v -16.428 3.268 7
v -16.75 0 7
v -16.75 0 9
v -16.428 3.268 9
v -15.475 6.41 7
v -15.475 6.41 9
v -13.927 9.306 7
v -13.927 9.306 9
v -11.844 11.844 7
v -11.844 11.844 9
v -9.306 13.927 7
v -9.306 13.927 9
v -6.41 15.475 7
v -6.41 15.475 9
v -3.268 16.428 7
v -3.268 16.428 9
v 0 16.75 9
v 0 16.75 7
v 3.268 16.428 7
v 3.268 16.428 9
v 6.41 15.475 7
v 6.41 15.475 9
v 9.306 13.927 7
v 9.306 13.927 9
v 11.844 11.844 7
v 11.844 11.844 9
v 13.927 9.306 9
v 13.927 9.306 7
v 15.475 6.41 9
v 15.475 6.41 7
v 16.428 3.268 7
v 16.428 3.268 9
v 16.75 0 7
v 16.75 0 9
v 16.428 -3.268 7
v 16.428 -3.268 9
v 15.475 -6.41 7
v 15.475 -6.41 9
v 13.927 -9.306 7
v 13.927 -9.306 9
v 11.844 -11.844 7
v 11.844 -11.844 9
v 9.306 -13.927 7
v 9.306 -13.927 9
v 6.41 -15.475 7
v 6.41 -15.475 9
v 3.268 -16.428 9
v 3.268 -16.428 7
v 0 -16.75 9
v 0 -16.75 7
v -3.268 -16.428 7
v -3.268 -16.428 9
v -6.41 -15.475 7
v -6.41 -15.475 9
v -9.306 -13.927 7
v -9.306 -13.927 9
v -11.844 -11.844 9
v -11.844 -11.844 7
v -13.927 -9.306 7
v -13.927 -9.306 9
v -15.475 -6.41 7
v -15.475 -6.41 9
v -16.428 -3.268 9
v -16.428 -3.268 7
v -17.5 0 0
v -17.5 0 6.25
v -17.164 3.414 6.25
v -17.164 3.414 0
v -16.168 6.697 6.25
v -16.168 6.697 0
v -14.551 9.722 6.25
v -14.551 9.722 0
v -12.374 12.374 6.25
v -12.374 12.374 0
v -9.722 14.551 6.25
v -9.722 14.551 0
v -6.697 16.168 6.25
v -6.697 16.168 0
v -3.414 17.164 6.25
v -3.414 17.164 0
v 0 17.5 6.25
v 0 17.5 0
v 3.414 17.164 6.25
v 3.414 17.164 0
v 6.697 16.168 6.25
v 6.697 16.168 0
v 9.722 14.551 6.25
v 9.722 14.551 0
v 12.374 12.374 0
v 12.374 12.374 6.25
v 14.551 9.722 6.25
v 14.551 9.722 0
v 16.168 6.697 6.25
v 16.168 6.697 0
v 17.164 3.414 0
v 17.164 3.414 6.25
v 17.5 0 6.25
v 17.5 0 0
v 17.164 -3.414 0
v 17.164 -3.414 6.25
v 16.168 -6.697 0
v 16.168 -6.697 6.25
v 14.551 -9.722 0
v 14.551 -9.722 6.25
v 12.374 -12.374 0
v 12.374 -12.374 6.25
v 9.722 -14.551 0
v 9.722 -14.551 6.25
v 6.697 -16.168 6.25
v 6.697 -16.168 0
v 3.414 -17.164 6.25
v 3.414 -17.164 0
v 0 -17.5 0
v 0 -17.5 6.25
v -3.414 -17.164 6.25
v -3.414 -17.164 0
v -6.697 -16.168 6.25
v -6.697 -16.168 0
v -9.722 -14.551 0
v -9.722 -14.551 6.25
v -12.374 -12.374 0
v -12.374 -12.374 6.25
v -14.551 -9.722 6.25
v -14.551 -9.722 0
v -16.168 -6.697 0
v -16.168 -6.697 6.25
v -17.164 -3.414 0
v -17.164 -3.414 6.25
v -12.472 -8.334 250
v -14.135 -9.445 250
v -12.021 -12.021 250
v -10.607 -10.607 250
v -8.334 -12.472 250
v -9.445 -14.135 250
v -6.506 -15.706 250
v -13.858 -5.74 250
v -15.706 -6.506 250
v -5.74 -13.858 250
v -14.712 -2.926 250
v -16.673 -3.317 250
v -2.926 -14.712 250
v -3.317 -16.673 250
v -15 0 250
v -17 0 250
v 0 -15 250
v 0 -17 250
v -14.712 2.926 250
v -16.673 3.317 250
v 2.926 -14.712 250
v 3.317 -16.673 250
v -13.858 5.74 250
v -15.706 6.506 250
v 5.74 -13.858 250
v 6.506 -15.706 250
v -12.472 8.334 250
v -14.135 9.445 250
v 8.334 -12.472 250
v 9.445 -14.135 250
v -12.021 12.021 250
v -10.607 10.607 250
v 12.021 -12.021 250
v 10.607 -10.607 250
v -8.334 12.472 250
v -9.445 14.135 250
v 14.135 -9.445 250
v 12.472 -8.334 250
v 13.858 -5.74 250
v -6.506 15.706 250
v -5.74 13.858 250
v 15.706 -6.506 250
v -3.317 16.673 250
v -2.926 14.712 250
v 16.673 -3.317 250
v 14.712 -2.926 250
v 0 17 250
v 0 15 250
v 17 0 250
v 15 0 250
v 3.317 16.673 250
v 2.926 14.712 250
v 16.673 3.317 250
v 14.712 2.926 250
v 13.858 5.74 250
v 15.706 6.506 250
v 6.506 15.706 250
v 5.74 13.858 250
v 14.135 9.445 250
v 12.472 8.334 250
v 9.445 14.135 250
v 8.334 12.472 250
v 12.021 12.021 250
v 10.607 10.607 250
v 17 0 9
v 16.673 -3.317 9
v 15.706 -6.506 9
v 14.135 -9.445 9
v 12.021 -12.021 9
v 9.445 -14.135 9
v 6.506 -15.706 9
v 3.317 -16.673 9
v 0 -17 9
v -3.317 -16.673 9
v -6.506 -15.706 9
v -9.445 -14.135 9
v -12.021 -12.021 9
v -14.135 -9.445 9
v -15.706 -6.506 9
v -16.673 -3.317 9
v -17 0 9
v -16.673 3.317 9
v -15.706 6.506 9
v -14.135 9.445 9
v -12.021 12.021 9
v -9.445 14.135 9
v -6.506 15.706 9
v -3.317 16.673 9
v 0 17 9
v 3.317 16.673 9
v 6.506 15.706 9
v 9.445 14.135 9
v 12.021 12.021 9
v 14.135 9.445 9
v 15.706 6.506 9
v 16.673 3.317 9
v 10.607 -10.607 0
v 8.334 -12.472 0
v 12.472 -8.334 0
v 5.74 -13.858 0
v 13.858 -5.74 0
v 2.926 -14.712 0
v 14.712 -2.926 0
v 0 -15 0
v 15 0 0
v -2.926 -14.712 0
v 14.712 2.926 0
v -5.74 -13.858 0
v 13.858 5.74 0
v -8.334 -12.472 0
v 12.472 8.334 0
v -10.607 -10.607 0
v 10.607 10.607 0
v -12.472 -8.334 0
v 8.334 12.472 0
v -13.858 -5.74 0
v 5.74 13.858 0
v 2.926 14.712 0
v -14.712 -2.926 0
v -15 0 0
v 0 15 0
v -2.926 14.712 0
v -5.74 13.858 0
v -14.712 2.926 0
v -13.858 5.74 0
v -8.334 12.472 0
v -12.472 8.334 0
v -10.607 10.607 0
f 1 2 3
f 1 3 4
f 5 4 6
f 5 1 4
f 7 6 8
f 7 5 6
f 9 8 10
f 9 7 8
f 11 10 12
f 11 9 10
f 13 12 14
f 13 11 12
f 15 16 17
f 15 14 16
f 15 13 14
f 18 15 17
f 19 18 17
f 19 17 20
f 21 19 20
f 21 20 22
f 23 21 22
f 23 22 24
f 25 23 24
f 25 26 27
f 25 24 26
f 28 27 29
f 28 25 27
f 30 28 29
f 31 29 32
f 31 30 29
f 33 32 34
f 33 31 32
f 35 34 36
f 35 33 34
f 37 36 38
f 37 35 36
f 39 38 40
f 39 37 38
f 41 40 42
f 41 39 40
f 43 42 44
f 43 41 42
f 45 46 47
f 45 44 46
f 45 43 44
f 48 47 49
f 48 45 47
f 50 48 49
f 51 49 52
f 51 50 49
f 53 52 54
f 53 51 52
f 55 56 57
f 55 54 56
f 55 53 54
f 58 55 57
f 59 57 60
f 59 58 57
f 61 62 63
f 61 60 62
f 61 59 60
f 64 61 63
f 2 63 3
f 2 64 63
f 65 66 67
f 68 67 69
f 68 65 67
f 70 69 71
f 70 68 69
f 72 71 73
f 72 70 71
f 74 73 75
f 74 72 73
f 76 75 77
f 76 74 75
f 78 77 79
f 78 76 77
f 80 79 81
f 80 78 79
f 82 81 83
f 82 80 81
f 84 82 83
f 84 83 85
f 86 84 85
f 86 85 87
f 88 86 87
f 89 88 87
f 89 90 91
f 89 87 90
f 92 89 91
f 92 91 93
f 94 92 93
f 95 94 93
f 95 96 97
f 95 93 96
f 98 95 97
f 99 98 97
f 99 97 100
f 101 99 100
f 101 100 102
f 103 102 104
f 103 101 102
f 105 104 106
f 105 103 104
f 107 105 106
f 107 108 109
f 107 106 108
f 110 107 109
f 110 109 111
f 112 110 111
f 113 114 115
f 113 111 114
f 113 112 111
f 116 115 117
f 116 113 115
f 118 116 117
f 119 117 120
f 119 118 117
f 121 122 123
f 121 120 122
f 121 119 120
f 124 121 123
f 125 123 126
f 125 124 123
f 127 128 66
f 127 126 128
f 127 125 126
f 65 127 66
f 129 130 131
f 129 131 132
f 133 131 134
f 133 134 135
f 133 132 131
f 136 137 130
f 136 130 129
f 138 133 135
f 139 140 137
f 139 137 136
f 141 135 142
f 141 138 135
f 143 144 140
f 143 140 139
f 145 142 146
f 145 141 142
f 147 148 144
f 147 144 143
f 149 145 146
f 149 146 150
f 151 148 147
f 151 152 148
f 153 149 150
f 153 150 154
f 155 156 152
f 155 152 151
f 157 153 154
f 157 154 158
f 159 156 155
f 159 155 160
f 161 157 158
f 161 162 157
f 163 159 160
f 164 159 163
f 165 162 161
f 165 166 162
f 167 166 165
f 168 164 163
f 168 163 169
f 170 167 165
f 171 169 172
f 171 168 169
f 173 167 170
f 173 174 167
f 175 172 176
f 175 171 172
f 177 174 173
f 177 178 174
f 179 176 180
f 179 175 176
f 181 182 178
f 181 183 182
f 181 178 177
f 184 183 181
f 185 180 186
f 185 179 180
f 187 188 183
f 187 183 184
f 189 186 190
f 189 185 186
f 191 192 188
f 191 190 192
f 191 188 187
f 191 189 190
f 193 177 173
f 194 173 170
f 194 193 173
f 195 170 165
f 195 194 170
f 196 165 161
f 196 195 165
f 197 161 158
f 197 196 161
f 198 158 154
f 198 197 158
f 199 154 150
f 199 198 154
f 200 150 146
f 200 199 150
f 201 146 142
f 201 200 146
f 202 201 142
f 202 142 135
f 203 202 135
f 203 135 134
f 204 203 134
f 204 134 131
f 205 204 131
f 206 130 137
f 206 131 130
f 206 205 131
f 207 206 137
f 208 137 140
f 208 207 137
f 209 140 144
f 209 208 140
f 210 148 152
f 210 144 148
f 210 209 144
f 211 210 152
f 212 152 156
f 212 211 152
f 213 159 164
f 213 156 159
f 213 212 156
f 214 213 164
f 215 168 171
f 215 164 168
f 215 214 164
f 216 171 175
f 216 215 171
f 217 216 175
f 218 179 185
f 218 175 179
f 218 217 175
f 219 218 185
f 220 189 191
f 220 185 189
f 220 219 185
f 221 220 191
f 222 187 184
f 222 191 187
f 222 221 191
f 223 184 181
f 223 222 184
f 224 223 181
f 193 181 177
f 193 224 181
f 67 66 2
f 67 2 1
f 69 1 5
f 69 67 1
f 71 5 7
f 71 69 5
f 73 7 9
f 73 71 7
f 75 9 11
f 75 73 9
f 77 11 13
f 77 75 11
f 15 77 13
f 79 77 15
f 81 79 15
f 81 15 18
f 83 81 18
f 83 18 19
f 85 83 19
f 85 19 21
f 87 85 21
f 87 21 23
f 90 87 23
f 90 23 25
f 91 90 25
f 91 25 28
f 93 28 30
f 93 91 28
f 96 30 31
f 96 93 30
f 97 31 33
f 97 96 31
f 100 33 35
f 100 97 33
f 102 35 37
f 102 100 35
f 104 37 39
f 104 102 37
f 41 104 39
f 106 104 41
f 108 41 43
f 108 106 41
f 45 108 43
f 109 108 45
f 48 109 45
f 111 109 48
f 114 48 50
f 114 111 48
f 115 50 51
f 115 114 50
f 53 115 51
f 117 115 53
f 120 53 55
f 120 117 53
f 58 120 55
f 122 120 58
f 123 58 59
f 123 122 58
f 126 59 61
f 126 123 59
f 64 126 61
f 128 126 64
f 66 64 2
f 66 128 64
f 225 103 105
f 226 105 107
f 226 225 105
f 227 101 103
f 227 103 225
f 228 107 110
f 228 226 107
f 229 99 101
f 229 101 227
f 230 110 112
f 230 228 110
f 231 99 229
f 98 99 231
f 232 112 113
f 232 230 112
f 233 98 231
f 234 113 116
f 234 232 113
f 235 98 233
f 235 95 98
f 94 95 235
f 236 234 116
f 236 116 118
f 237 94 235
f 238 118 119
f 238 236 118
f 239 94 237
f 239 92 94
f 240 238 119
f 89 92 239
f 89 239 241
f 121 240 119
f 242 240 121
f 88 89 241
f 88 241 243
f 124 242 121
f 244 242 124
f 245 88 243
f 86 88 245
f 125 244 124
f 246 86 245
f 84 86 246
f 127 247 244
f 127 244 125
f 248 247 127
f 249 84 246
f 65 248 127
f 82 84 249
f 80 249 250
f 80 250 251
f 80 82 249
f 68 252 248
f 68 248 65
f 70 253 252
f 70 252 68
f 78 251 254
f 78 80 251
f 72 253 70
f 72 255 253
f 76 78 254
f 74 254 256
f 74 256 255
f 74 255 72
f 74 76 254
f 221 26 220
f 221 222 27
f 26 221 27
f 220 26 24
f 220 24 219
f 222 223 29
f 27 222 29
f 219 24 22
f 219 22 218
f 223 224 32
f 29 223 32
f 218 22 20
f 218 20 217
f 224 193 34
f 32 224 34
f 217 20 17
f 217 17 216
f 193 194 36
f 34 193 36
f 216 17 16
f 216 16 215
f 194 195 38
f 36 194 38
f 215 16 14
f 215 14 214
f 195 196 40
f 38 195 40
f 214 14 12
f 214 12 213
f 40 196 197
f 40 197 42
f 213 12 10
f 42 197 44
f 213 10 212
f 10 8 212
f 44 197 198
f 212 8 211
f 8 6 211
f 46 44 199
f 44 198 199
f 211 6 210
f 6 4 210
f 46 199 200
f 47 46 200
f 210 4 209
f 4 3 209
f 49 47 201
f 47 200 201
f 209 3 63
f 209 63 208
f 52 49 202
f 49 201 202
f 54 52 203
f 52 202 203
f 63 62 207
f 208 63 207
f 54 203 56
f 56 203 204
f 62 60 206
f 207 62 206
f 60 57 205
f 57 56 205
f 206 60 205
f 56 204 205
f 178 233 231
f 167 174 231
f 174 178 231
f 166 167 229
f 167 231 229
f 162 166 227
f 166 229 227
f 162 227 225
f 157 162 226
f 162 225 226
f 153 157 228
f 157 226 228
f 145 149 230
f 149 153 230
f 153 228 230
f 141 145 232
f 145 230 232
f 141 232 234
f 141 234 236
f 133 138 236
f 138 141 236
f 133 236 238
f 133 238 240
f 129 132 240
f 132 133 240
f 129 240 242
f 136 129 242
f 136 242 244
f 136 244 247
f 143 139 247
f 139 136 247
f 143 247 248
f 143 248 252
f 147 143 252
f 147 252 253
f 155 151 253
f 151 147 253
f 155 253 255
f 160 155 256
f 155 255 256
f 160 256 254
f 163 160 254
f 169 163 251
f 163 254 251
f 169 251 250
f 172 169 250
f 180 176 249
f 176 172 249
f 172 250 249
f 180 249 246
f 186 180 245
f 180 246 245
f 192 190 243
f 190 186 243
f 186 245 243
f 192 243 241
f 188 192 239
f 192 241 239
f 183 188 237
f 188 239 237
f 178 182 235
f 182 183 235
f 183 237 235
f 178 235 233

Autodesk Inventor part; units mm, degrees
ref_plane "YZ Plane" through (0, 0, 0) normal (1, 0, 0) x (0, 1, 0)
ref_plane "XZ Plane" through (0, 0, 0) normal (0, 1, 0) x (-1, 0, 0)
ref_plane "XY Plane" through (0, 0, 0) normal (0, 0, 1) x (1, 0, 0)
sketch "Skizze1" plane through (0, 0, 0) normal (0, 0, 1) x (1, 0, 0)
  circle A0 centre (0, 0) radius 15
  circle A1 centre (0, 0) radius 17.5
  dimension "d0" = 35
  dimension "d1" = 2.5
extrude "Extrusion1" add sketch "Skizze1" along normal blind 250
sketch "Skizze2" plane through (0, 0, 250) normal (0, 0, 1) x (1, 0, 0)
  circle A0 centre (0, 0) radius 17.5 projected
  circle A1 centre (0, 0) radius 17
  dimension "d4" = 34
extrude "Extrusion2" cut sketch "Skizze2" against normal through all
sketch "Skizze3" plane through (0, 0, 0) normal (0, 0, -1) x (-1, 0, 0)
  circle A0 centre (0, 0) radius 17 projected
  circle A1 centre (0, 0) radius 15 projected
  circle A2 centre (0, 0) radius 17.5
  dimension "d7" = 35
extrude "Extrusion3" add sketch "Skizze3" against normal blind 9 contours A2
sketch "Skizze4" plane through (0, 0, 250) normal (0, 0, 1) x (1, 0, 0)
  circle A0 centre (0, 0) radius 17 projected
  circle A1 centre (0, 0) radius 15 projected
  circle A2 centre (0, 0) radius 16.5
  dimension "d10" = 33
extrude "Extrusion4" cut sketch "Skizze4" against normal blind 50 contours A0
sketch "Skizze5" plane through (0, 0, 0) normal (0, 1, 0) x (-1, 0, 0)
  line L0 (-17.5, 9) -> (17.5, 9) projected
  line L1 (17.5, 0) -> (-17.5, 0) projected
  line L2 (17, 9) -> (-17, 9) projected
  line L3 (17.5, 0) -> (17.5, 9) projected
  line L4 (15, 0) -> (15, 250) projected
  line L5 (17, 200) -> (17, 9) projected
  line L6 (17.5, 9) -> (16.75, 9)
  line L7 (16.75, 9) -> (16.75, 7)
  line L8 (16.75, 7) -> (17.5, 7)
  line L9 (17.5, 7) -> (17.5, 9)
  line L10 (24.5, 0) -> (-24.5, 0) projected
  line L11 (0, -50) -> (0, 300) projected
  point P0 (0, 0)
  point P1 (-9.75, 200)
  point P2 (9.75, 200)
  dimension "d13" = 2
  dimension "d14" = 33.5
revolve "Umdrehung1" cut sketch "Skizze5" angle 360 about axis through (0, 0, -10) along (0, 0, 1) contours L0 L3 L8 L7
chamfer "Fase1" distance 0.75 angle 45 1 edges at (17.5, 0, 7)
thread "Gewinde5" size "M35x1.5" class "6g" standard "ANSI Metric M Profile" full length
sketch "Skizze6" plane through (0, 0, 200) normal (0, 0, 1) x (1, 0, 0)
  circle A0 centre (0, 0) radius 16.5 projected
  circle A1 centre (0, 0) radius 17 projected
extrude "Extrusion5" add sketch "Skizze6" along normal blind 50
properties part number "13_0204_027"
